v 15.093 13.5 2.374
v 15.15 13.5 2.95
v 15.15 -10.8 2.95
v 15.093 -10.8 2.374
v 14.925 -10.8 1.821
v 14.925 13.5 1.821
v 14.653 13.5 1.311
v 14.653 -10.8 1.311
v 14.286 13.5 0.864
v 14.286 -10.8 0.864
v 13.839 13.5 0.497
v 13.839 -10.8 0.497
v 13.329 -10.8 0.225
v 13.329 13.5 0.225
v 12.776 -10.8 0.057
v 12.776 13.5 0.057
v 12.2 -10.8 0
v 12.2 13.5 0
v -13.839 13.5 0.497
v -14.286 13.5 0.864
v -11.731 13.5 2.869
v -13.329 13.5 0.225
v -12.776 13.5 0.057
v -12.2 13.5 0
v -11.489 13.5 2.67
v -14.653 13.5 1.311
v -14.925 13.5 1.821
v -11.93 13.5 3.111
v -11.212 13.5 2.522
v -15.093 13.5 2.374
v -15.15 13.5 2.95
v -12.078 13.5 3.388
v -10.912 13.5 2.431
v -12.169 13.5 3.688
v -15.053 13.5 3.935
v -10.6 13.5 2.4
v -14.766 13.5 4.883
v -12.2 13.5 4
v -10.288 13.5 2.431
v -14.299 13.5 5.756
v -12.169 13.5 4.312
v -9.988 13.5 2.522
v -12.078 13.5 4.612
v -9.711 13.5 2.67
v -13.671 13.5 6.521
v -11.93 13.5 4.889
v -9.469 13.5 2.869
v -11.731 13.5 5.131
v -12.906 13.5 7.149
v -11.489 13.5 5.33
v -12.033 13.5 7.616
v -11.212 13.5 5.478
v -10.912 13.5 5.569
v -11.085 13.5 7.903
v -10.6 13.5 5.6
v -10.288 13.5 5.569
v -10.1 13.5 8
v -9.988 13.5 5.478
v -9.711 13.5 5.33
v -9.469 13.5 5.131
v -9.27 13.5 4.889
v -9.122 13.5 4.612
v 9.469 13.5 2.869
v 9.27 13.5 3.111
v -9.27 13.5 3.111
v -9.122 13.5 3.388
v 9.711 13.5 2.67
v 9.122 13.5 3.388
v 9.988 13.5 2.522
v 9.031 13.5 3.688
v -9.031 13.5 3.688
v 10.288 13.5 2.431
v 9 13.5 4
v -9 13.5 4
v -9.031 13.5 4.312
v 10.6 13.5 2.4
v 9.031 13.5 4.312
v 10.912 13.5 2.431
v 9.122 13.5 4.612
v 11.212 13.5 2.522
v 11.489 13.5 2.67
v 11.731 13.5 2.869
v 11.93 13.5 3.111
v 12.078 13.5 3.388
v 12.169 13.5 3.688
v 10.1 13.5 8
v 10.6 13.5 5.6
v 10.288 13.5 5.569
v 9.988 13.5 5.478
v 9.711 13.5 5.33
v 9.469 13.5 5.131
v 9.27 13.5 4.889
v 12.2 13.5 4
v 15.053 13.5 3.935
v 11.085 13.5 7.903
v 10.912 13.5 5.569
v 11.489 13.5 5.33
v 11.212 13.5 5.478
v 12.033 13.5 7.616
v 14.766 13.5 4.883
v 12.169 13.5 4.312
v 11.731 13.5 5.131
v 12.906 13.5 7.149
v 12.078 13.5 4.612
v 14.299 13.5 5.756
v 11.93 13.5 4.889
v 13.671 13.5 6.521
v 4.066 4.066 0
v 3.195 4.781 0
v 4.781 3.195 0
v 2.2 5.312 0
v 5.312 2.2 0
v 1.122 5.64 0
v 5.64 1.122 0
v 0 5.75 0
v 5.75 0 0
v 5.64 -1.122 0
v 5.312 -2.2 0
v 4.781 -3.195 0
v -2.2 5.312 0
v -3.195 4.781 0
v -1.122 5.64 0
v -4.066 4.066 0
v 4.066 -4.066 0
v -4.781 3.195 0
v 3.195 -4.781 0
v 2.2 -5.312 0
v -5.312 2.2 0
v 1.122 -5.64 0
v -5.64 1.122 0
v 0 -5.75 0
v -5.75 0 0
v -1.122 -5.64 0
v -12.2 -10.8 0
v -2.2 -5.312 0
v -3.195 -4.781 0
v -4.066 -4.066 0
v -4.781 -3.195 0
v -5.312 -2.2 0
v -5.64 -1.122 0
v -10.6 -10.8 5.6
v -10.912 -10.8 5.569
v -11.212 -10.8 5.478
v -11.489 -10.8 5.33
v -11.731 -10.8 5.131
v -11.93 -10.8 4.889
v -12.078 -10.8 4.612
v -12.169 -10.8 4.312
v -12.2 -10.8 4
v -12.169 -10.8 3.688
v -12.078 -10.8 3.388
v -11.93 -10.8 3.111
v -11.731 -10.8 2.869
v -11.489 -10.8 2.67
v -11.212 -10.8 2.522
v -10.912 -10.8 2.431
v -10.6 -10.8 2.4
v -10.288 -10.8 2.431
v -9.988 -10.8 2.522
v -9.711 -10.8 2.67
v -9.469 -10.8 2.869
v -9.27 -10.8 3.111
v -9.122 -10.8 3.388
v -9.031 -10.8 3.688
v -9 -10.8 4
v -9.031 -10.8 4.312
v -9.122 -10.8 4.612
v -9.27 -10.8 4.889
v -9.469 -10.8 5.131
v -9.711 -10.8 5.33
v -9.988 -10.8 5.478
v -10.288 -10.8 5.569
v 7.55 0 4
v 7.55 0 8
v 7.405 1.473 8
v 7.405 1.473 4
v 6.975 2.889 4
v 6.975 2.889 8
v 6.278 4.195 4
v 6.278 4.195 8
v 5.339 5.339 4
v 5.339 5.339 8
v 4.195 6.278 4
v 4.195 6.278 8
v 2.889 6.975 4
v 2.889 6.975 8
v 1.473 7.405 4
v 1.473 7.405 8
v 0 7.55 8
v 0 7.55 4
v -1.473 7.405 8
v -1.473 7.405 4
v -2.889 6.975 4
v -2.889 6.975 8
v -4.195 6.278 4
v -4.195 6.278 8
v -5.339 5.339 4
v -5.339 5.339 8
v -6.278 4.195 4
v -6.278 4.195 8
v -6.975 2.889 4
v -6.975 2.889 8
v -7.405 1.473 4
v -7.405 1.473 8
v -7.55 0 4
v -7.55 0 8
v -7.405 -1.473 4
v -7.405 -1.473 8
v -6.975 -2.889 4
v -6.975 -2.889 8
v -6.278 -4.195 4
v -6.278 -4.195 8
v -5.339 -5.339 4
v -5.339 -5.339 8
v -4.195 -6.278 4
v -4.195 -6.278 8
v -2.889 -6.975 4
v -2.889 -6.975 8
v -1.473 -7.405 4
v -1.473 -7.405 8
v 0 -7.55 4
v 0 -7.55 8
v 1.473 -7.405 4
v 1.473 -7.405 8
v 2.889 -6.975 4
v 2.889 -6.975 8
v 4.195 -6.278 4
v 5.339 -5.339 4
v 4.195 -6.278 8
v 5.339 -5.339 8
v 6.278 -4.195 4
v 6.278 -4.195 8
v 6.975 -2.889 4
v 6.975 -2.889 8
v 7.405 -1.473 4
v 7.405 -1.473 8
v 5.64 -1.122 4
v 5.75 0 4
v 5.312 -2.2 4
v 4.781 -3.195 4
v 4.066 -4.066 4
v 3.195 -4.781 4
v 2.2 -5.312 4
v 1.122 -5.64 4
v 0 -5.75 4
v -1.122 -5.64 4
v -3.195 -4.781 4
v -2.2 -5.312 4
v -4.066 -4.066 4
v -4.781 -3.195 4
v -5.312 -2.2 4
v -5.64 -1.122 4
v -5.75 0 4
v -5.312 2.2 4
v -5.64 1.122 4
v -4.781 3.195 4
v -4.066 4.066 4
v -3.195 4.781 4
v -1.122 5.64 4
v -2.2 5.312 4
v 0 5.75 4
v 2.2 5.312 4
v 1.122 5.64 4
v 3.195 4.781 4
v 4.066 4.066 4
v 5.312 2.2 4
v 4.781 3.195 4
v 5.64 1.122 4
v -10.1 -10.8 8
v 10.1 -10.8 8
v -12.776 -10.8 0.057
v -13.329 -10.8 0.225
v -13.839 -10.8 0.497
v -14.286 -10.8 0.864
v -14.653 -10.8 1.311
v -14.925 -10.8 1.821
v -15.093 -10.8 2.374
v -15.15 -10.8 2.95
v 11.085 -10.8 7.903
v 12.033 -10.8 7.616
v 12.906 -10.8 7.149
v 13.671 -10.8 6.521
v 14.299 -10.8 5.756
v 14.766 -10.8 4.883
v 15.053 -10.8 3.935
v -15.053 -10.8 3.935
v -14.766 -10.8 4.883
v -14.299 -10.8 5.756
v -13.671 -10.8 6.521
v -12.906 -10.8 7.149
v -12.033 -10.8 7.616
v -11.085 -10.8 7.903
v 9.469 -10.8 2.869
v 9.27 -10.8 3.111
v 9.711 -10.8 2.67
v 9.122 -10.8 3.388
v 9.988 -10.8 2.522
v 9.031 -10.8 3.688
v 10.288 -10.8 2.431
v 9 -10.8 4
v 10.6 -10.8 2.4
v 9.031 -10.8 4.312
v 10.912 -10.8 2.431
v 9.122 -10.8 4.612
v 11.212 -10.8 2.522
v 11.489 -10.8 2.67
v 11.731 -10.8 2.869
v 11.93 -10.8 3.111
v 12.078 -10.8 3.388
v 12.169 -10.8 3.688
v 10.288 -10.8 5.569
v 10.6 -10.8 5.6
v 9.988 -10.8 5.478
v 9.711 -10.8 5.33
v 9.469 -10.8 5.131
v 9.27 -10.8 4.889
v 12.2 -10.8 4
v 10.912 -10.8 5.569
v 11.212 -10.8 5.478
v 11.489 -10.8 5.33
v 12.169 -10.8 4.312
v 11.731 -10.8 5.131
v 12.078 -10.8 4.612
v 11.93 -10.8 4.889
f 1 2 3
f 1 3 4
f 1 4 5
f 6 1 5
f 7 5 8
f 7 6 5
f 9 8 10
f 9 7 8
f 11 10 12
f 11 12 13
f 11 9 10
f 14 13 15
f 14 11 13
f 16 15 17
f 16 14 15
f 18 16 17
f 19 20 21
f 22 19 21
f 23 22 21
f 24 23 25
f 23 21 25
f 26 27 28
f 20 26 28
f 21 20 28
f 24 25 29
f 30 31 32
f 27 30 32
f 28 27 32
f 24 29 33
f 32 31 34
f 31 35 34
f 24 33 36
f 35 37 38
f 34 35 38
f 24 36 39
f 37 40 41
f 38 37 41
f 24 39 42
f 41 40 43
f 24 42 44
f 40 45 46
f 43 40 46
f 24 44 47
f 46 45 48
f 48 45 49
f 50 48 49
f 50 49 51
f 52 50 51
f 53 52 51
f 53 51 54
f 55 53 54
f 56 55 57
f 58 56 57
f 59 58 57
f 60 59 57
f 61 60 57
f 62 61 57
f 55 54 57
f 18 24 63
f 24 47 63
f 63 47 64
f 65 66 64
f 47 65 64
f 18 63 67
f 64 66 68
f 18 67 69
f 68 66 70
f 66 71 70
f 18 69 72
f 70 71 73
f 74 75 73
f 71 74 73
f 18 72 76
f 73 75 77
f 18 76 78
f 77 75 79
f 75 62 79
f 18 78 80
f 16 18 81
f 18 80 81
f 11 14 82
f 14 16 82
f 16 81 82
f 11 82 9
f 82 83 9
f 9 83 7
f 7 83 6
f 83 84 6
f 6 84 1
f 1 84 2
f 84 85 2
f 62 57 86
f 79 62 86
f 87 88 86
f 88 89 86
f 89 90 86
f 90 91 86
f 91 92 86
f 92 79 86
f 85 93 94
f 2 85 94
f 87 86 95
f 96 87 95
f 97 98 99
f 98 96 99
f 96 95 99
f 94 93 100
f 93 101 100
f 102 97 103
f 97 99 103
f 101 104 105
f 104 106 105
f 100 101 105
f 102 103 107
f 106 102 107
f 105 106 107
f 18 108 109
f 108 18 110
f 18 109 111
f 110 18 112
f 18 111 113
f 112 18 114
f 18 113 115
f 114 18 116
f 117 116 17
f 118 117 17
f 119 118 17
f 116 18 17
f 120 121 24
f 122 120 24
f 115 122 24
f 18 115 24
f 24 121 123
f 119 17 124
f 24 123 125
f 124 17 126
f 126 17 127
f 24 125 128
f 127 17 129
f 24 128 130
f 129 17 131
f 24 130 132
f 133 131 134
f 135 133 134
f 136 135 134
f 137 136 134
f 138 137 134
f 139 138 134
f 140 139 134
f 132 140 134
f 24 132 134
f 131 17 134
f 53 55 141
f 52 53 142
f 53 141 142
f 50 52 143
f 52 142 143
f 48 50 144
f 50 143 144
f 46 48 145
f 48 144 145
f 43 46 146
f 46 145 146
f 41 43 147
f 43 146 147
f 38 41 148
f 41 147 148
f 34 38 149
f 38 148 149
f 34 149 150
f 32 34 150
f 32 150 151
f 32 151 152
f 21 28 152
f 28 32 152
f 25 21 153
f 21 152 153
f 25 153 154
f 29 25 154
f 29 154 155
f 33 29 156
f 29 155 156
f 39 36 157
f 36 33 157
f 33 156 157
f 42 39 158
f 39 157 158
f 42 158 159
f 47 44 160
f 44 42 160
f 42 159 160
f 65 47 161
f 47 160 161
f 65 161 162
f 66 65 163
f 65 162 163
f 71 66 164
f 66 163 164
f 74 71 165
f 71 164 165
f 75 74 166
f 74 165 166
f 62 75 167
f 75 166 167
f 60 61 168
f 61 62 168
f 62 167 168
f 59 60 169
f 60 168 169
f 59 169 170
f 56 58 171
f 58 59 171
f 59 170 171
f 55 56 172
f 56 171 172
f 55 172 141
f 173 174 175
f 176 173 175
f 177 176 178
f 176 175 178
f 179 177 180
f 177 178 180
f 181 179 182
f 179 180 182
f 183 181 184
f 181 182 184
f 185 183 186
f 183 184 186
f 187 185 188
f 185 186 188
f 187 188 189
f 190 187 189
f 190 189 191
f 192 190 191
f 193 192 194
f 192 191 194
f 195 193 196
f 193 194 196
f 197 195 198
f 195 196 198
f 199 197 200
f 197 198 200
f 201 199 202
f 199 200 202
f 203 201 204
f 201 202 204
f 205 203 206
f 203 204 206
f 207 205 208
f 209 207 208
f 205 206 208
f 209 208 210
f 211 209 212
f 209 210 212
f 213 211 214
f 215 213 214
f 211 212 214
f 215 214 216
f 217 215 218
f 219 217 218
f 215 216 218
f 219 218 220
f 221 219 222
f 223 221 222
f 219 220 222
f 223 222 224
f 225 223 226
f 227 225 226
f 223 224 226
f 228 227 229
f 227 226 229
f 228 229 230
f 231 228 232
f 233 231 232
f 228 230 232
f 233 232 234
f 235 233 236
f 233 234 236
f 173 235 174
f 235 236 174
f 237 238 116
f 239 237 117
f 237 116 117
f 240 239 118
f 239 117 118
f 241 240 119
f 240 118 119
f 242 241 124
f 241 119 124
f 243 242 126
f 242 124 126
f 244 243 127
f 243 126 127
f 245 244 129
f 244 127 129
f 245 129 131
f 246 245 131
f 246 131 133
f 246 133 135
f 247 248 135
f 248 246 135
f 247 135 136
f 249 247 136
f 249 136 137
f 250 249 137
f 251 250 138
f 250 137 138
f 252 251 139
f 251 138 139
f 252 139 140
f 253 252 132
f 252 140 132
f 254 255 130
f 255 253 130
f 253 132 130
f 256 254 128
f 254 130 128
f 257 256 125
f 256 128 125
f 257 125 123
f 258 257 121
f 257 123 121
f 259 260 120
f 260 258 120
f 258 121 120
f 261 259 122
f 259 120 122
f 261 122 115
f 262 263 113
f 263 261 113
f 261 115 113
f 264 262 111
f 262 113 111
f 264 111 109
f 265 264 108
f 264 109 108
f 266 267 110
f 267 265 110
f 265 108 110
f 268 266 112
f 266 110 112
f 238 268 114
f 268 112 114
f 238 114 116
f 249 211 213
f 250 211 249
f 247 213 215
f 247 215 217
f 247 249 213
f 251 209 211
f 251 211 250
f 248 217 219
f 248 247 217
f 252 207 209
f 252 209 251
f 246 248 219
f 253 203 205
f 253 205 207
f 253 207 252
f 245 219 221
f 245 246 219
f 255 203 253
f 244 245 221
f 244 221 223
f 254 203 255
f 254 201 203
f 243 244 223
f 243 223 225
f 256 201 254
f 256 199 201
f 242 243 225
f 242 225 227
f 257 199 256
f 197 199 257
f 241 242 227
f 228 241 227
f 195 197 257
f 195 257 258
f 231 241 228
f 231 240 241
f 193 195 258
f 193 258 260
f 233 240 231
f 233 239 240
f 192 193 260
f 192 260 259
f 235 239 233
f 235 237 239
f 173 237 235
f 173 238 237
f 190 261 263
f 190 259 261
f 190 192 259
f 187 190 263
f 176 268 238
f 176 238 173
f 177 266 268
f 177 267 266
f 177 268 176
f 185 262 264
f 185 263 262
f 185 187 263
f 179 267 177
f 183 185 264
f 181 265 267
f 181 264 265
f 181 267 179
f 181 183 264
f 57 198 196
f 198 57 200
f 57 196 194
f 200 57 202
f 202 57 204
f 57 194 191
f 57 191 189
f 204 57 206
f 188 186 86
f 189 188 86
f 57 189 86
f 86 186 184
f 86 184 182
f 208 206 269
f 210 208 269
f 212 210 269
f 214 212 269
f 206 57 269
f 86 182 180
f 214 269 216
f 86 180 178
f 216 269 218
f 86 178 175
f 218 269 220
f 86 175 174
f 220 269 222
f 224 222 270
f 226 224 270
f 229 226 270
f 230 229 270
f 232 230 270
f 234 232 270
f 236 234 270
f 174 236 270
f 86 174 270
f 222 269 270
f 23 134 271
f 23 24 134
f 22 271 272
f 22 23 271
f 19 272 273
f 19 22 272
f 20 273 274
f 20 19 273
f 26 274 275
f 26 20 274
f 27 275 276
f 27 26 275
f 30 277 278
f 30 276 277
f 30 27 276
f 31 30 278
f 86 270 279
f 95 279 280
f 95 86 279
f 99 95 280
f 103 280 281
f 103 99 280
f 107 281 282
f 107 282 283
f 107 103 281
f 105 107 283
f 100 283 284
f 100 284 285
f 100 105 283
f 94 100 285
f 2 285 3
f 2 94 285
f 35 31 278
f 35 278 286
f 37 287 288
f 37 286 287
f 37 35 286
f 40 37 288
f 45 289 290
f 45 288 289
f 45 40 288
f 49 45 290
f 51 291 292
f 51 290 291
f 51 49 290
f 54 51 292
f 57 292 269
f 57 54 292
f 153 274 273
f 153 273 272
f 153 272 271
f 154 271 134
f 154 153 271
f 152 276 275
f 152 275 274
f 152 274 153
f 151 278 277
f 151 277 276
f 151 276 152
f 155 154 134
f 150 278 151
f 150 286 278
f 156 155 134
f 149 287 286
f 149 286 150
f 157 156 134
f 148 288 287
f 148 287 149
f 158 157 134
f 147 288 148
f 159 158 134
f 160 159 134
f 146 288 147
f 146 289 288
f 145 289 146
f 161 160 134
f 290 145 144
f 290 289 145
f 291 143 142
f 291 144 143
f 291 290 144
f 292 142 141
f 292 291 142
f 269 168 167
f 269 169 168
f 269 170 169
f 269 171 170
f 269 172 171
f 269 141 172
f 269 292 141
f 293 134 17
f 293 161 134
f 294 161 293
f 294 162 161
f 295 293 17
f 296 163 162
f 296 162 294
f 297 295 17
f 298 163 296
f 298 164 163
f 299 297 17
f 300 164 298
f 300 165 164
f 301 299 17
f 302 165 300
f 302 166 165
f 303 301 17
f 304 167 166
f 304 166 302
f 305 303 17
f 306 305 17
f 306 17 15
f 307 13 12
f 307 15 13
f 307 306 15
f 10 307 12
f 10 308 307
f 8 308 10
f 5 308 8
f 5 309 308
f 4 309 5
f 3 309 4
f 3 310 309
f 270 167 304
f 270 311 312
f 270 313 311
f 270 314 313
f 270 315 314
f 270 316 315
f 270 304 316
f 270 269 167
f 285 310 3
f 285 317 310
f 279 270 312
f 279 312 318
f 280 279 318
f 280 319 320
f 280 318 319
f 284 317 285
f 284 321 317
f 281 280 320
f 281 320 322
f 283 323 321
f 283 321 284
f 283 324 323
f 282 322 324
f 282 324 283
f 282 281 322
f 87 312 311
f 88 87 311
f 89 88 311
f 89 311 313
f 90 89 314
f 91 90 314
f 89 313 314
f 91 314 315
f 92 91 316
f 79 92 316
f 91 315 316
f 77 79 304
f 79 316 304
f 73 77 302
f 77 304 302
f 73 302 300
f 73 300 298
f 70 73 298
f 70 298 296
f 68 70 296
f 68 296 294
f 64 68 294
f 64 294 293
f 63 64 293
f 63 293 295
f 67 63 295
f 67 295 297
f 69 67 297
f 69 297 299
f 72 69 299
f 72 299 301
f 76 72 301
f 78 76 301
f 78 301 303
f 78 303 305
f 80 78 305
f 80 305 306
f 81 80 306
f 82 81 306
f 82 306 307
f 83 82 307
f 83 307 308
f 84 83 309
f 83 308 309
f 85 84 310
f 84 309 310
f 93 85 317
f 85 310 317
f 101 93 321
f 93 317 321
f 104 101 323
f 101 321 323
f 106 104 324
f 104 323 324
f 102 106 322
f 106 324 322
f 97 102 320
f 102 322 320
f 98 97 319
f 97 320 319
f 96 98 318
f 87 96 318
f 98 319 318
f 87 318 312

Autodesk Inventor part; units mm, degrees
ref_plane "YZ Plane" through (0, 0, 0) normal (1, 0, 0) x (0, 1, 0)
ref_plane "XZ Plane" through (0, 0, 0) normal (0, 1, 0) x (-1, 0, 0)
sketch "Эскиз1" plane through (0, 0, 0) normal (0, 0, 1) x (1, 0, 0)
  circle A0 centre (0, 0) radius 5.75
  circle A1 centre (0, 0) radius 9.55
  line L0 (9.55, 13.5) -> (-9.55, 13.5)
  line L1 (-9.55, 13.5) -> (-9.55, 0)
  line L2 (-9.55, 0) -> (9.55, 0)
  line L3 (9.55, 0) -> (9.55, 13.5)
  line L4 (9.55, 0) -> (-9.55, 0)
  line L5 (-9.55, 0) -> (-9.55, -10.8)
  line L6 (-9.55, -10.8) -> (9.55, -10.8)
  line L7 (9.55, -10.8) -> (9.55, 0)
  point P0 (9.55, 0)
  point P1 (0, 9.55)
  point P2 (-9.55, 0)
  point P3 (9.55, 0)
  point P4 (-9.55, 0)
  dimension "d0" = 11.5
  dimension "d1" = 19.1
  dimension "d64" = 10.8
  dimension "d85" = 13.5
extrude "Выдавливание1" add sketch "Эскиз1" along normal blind 8 contours L2 A1 A0 | A0 L2 A1 | L7 L6 L5 A1 | A1 L1 L0 L3
sketch "Эскиз15" plane through (0, 0, 8) normal (0, 0, 1) x (1, 0, 0)
  circle A0 centre (0, 0) radius 5.75 projected
  circle A1 centre (0, 0) radius 7.55
  dimension "d67" = 15.1
extrude "Выдавливание9" cut sketch "Эскиз15" against normal blind 4
ref_plane "РабПлоскость6" through (0, -10.8, 0) normal (1, 0, 0) x (0, 0, -1)
sketch "Эскиз16" plane through (-9.55, -10.8, 0) normal (0, -1, 0) x (1, 0, 0)
  line L0 (0, 8) -> (19.1, 8) projected
  line L1 (19.1, 8) -> (24.7, 8)
  line L2 (24.7, 8) -> (24.7, 0)
  line L3 (24.7, 0) -> (19.1, 0)
  line L4 (19.1, 0) -> (19.1, 8)
  point P0 (9.55, 0)
  dimension "d70" = 5.6
  dimension "d71" = 8
extrude "Выдавливание10" add sketch "Эскиз16" against normal up to surface (24.3 mm away)
sketch "Эскиз17" plane through (-9.55, 13.5, 0) normal (0, 1, 0) x (1, 0, 0)
  line L0 (24.7, 0) -> (24.7, -8) projected
  line L1 (24.7, -4) -> (20.15, -4)
  point P0 (9.55, 0)
  dimension "d82" = 4.55
hole "Отверстие4" at (10.6, 13.5, 4) direction (0, -1, 0) diameter 3.2 end through all
fillet "Сопряжение5" radius 5.05 1 edges at (15.15, 1.35, 8)
fillet "Сопряжение5" radius 2.95 1 edges at (15.15, 1.35, 0)
mirror "Зеркальное отражение5" about plane through (0, -10.8, 0) normal (1, 0, 0) of "Сопряжение5", "Отверстие4", "Выдавливание10"
ref_plane "РабПлоскость7" through (0, -10.8, 0) normal (1, 0, 0) x (0, 0, -1)
properties part number "Крепление дифференциала"
